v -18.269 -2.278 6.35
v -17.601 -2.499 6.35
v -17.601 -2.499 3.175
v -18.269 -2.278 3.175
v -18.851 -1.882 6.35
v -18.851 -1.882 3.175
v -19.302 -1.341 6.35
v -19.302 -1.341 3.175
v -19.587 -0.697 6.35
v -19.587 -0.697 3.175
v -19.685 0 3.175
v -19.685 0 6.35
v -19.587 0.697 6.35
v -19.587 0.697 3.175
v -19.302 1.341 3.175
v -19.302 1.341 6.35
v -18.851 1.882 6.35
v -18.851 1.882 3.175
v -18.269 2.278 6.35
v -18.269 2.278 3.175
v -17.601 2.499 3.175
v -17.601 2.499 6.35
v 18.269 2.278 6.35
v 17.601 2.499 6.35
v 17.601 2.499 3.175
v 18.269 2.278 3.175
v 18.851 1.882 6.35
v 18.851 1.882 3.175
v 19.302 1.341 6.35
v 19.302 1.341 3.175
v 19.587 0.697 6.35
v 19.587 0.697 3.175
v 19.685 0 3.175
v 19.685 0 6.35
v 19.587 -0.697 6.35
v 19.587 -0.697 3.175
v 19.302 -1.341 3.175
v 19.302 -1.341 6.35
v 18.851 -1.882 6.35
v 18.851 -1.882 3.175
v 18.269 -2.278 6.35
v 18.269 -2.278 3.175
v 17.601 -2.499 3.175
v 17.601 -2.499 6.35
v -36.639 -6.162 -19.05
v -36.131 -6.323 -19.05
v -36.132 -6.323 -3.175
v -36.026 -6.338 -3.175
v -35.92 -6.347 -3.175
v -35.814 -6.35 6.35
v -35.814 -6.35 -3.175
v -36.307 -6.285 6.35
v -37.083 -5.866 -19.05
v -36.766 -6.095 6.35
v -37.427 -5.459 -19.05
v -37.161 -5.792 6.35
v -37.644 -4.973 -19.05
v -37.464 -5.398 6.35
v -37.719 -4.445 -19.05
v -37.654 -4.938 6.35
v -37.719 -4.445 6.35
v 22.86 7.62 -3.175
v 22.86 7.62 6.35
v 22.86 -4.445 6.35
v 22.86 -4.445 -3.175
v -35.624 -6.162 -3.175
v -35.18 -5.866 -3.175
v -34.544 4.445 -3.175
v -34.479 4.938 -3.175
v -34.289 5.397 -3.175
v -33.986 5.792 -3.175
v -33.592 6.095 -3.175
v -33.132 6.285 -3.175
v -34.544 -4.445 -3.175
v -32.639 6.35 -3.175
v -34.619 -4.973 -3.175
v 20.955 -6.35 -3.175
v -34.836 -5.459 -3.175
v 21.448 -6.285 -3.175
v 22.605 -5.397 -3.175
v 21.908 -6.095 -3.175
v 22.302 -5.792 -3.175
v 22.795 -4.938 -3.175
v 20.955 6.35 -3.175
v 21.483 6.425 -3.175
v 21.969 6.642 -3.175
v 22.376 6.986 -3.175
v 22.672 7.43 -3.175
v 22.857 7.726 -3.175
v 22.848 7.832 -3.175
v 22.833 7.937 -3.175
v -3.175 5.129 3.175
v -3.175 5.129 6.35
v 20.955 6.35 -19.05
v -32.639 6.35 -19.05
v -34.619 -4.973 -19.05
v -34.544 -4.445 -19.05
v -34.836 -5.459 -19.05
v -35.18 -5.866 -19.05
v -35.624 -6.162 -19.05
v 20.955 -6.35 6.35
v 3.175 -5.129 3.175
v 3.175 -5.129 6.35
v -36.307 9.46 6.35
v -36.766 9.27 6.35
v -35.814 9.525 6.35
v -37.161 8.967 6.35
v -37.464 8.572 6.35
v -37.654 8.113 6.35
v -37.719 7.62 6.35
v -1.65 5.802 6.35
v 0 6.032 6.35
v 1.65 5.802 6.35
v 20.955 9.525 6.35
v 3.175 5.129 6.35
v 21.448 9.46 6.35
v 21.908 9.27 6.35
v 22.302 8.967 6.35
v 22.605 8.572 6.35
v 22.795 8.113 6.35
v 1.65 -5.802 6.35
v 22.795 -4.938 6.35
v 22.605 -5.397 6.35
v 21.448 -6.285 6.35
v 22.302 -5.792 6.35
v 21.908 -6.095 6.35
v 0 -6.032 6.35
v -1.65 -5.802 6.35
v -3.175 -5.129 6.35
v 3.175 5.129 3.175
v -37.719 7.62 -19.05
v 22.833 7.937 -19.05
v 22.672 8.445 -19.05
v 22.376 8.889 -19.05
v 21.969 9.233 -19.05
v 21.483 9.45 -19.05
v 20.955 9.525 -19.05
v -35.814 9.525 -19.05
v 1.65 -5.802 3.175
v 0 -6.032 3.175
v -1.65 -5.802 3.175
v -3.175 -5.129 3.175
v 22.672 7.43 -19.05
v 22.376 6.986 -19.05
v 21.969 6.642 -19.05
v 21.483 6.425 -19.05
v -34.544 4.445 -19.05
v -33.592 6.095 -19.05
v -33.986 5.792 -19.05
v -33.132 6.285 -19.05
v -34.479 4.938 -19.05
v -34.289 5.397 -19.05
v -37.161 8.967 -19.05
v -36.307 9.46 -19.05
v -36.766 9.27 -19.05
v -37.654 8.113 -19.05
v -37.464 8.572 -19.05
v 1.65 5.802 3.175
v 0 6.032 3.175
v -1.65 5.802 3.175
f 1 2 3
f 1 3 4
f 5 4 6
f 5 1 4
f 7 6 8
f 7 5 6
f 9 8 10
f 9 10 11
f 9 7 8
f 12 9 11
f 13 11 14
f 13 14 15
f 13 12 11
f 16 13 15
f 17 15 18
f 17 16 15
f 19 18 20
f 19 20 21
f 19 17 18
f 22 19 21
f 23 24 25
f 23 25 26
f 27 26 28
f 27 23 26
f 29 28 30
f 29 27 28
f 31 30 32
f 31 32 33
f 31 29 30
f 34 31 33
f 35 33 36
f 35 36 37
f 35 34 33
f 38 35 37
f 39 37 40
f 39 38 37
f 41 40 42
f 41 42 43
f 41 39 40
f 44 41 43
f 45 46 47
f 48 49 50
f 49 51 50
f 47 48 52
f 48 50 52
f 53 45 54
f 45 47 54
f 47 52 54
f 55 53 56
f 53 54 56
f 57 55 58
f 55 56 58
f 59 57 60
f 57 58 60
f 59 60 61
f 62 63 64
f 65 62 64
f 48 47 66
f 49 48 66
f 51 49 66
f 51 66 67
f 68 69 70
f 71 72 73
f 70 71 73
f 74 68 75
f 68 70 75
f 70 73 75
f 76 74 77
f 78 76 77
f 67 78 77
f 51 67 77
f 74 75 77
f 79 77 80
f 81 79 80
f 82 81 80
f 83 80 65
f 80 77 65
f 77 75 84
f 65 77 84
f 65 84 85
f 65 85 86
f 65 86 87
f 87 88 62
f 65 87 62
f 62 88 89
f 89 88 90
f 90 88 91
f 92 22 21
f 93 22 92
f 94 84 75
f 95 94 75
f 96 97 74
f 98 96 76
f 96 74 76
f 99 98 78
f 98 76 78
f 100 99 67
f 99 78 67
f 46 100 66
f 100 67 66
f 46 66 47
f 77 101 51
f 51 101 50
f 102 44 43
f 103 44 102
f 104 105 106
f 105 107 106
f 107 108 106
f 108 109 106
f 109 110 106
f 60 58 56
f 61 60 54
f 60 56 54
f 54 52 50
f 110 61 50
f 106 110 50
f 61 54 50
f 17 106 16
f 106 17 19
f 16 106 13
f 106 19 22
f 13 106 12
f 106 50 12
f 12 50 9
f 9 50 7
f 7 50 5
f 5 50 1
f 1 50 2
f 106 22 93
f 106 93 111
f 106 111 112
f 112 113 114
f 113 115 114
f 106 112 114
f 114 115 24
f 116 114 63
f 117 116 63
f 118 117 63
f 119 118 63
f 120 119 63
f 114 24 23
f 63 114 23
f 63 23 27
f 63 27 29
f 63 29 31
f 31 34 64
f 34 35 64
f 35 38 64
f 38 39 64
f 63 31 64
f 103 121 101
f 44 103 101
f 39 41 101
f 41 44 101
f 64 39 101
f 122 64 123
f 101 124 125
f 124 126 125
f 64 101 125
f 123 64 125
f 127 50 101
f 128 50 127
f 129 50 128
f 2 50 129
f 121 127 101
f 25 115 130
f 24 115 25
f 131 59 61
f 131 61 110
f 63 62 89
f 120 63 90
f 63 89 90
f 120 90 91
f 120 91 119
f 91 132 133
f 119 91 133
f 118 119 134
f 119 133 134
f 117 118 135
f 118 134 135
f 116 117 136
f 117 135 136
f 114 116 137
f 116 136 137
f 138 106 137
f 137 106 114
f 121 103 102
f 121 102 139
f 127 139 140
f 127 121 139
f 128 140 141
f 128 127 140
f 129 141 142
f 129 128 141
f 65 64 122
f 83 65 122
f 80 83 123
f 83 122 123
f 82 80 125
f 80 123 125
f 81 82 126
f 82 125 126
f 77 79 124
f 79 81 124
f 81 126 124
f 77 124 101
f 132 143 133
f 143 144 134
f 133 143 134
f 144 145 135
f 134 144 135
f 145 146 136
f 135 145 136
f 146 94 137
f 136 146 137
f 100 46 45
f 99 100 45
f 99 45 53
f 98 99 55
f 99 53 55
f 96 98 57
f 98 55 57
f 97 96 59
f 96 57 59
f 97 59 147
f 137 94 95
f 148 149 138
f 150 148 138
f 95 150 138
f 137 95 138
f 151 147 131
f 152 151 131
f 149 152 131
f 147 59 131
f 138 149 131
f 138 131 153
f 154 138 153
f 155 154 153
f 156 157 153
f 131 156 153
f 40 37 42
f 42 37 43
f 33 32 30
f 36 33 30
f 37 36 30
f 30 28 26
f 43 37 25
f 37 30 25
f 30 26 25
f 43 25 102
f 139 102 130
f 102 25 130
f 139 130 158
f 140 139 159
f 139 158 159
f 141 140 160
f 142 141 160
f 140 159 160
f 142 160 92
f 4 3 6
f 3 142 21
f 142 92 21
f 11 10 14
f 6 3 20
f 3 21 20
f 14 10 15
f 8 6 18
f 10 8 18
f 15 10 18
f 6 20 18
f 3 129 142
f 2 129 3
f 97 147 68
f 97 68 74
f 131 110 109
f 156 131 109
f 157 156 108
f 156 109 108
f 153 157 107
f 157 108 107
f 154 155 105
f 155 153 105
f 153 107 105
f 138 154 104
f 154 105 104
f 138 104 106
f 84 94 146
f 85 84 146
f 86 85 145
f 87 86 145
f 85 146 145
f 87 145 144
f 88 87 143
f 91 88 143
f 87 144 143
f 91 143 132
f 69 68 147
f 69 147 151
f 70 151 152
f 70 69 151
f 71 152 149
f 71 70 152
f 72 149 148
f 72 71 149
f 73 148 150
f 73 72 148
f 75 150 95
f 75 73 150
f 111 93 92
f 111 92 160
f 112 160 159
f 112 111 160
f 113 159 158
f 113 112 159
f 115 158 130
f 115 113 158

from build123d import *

# Parameters (mm, degrees)
SKETCH1_W                       = 75.438
SKETCH1_H                       = 12.7
BOSS_EXTRUDE1_DEPTH             = 6.35
CUT_EXTRUDE1_DEPTH              = 3.175
BOSS_EXTRUDE2_REACH             = 40.773
SKETCH3_W                       = 75.438
SKETCH3_H                       = 19.05
SKETCH3_W_2                     = 69.088
SKETCH3_H_2                     = 12.7
BOSS_EXTRUDE2_DIRECTION_2_REACH = 40.773
SKETCH4_W                       = 75.438
SKETCH4_H                       = 25.4
BOSS_EXTRUDE4_DEPTH             = 3.175
SKETCH7_W                       = 14.859
SKETCH7_H                       = 15.875
CUT_EXTRUDE3_DEPTH              = 47.460828512
SKETCH8_W                       = 3.175
SKETCH8_H                       = 15.875
CUT_EXTRUDE4_DEPTH              = 65.214043371
BOSS_EXTRUDE5_DEPTH             = 3.175
FILLET2_R                       = 1.905


with BuildPart() as part:
    # Sketch1 → Boss-Extrude1 (new body)
    with BuildSketch(Plane.XY):
        Rectangle(SKETCH1_W, SKETCH1_H)
    extrude(amount=BOSS_EXTRUDE1_DEPTH)

    # Sketch2 → Cut-Extrude1 (cut)
    with BuildSketch(Plane.XY.offset(6.35)):
        with BuildLine():
            Line((3.175, 5.129369479), (17.6006647, 2.498793645))
            ThreePointArc((17.6006647, 2.498793645), (19.685, 0), (17.6006647, -2.498793645))
            Line((17.6006647, -2.498793645), (3.175, -5.129369479))
            ThreePointArc((3.175, -5.129369479), (0, -6.0325), (-3.175, -5.129369479))
            Line((-3.175, -5.129369479), (-17.6006647, -2.498793645))
            ThreePointArc((-17.6006647, -2.498793645), (-19.685, 0), (-17.6006647, 2.498793645))
            Line((-17.6006647, 2.498793645), (-3.175, 5.129369479))
            ThreePointArc((-3.175, 5.129369479), (0, 6.0325), (3.175, 5.129369479))
        make_face()
    extrude(amount=-CUT_EXTRUDE1_DEPTH, mode=Mode.SUBTRACT)

    # Boss-Extrude2: up to this face of the body (flat: up to its plane)
    boss_extrude2_end = Plane(part.part.faces().sort_by_distance((0, 6.35, 3.175))[0])
    # Sketch3 → Boss-Extrude2 (add, up to the picked face)
    with BuildSketch(Plane(origin=(0, 0, 0), x_dir=(1, 0, 0), z_dir=(0, 1, 0)), mode=Mode.PRIVATE) as boss_extrude2_sk1:
        with Locations((0, 9.525)):
            Rectangle(SKETCH3_W, SKETCH3_H)
        with Locations((0, 9.525)):
            Rectangle(SKETCH3_W_2, SKETCH3_H_2, mode=Mode.SUBTRACT)
    boss_extrude2_tool1 = split(extrude(boss_extrude2_sk1.sketch, amount=BOSS_EXTRUDE2_REACH, mode=Mode.PRIVATE), bisect_by=boss_extrude2_end, keep=Keep.BOTH, mode=Mode.PRIVATE)
    add(boss_extrude2_tool1.solids().sort_by(Axis((0, 0, -0.778061), (0, 1, 0)))[0])

    # Boss-Extrude2 direction 2: up to this face of the body (flat: up to its plane)
    boss_extrude2_direction_2_end = Plane(part.part.faces().sort_by_distance((0, -6.35, 3.175))[0])
    # Sketch3 → Boss-Extrude2 direction 2 (add, up to the picked face)
    with BuildSketch(Plane(origin=(0, 0, 0), x_dir=(1, 0, 0), z_dir=(0, 1, 0)), mode=Mode.PRIVATE) as boss_extrude2_direction_2_sk1:
        with Locations((0, 9.525)):
            Rectangle(SKETCH3_W, SKETCH3_H)
        with Locations((0, 9.525)):
            Rectangle(SKETCH3_W_2, SKETCH3_H_2, mode=Mode.SUBTRACT)
    boss_extrude2_direction_2_tool1 = split(extrude(boss_extrude2_direction_2_sk1.sketch, amount=-BOSS_EXTRUDE2_DIRECTION_2_REACH, mode=Mode.PRIVATE), bisect_by=boss_extrude2_direction_2_end, keep=Keep.BOTH, mode=Mode.PRIVATE)
    add(boss_extrude2_direction_2_tool1.solids().sort_by(Axis((0, 0, -0.778061), (0, -1, 0)))[0])

    # Sketch4 → Boss-Extrude4 (add)
    with BuildSketch(Plane(origin=(0, 6.35, 0), x_dir=(1, 0, 0), z_dir=(0, 1, 0))):
        with Locations((0, 6.35)):
            Rectangle(SKETCH4_W, SKETCH4_H)
    extrude(amount=BOSS_EXTRUDE4_DEPTH)

    # Sketch7 → Cut-Extrude3 (cut, through all)
    with BuildSketch(Plane.XY.offset(6.35)):
        with Locations((30.2895, 1.5875)):
            Rectangle(SKETCH7_W, SKETCH7_H)
    extrude(amount=-CUT_EXTRUDE3_DEPTH, mode=Mode.SUBTRACT)

    # Sketch8 → Cut-Extrude4 (cut, through all)
    with BuildSketch(Plane(origin=(22.86, 0, 0), x_dir=(0, 0, -1), z_dir=(1, 0, 0))):
        with Locations((17.4625, 1.5875)):
            Rectangle(SKETCH8_W, SKETCH8_H)
    extrude(amount=-CUT_EXTRUDE4_DEPTH, mode=Mode.SUBTRACT)

    # Sketch9 → Boss-Extrude5 (add)
    with BuildSketch(Plane(origin=(0, 0, -15.875), x_dir=(-1, 0, 0), z_dir=(0, 0, -1))):
        Polygon((34.544, 6.35), (34.544, -6.35), (37.719, -6.35), (37.719, 9.525), (-22.86, 9.525), (-22.86, 6.35), align=None)
    extrude(amount=BOSS_EXTRUDE5_DEPTH)

    # Fillet2
    # the kernel refuses this fillet: 1.905 mm, written as the material it adds along each edge
    with BuildSketch(Plane(origin=(-34.544, 6.35, 1.5875), x_dir=(0, -1, 0), z_dir=(0, 0, -1))) as fillet2_piece_1:
        with BuildLine():
            CenterArc((FILLET2_R, -FILLET2_R), FILLET2_R, 90, 90)
            Line((0, -FILLET2_R), (0, 0))
            Line((0, 0), (FILLET2_R, 0))
        make_face()
    extrude(amount=20.6375)
    # the kernel refuses this fillet: 1.905 mm, written as the material it takes off along each edge
    with BuildSketch(Plane(origin=(-37.719, 9.525, 11.1125), x_dir=(0, -1, 0), z_dir=(0, 0, -1)), Plane(origin=(-37.719, -6.35, 11.1125), x_dir=(1, 0, 0), z_dir=(0, 0, -1))) as fillet2_2_piece_1:
        with BuildLine():
            CenterArc((FILLET2_R, -FILLET2_R), FILLET2_R, 90, 90)
            Line((0, -FILLET2_R), (0, 0))
            Line((0, 0), (FILLET2_R, 0))
        make_face()
    extrude(amount=34.925, mode=Mode.SUBTRACT)
    with BuildSketch(Plane(origin=(-34.544, -6.35, -3.175), x_dir=(0, 1, 0), z_dir=(0, 0, -1))) as fillet2_2_piece_2:
        with BuildLine():
            CenterArc((FILLET2_R, -FILLET2_R), FILLET2_R, 90, 90)
            Line((0, -FILLET2_R), (0, 0))
            Line((0, 0), (FILLET2_R, 0))
        make_face()
    extrude(amount=20.6375, mode=Mode.SUBTRACT)
    with BuildSketch(Plane(origin=(22.86, 6.35, -23.8125), x_dir=(0, 1, 0), z_dir=(0, 0, 1))) as fillet2_2_piece_3:
        with BuildLine():
            CenterArc((FILLET2_R, FILLET2_R), FILLET2_R, 180, 90)
            Line((0, FILLET2_R), (0, 0))
            Line((0, 0), (FILLET2_R, 0))
        make_face()
    extrude(amount=20.6375, mode=Mode.SUBTRACT)
    with BuildSketch(Plane(origin=(22.86, 9.525, -23.8125), x_dir=(-1, 0, 0), z_dir=(0, 0, 1))) as fillet2_2_piece_4:
        with BuildLine():
            CenterArc((FILLET2_R, FILLET2_R), FILLET2_R, 180, 90)
            Line((0, FILLET2_R), (0, 0))
            Line((0, 0), (FILLET2_R, 0))
        make_face()
    extrude(amount=34.925, mode=Mode.SUBTRACT)
    with BuildSketch(Plane(origin=(22.86, -6.35, 11.1125), x_dir=(-1, 0, 0), z_dir=(0, 0, -1))) as fillet2_2_piece_5:
        with BuildLine():
            CenterArc((FILLET2_R, FILLET2_R), FILLET2_R, 180, 90)
            Line((0, FILLET2_R), (0, 0))
            Line((0, 0), (FILLET2_R, 0))
        make_face()
    extrude(amount=19.05, mode=Mode.SUBTRACT)


solid = part.part
